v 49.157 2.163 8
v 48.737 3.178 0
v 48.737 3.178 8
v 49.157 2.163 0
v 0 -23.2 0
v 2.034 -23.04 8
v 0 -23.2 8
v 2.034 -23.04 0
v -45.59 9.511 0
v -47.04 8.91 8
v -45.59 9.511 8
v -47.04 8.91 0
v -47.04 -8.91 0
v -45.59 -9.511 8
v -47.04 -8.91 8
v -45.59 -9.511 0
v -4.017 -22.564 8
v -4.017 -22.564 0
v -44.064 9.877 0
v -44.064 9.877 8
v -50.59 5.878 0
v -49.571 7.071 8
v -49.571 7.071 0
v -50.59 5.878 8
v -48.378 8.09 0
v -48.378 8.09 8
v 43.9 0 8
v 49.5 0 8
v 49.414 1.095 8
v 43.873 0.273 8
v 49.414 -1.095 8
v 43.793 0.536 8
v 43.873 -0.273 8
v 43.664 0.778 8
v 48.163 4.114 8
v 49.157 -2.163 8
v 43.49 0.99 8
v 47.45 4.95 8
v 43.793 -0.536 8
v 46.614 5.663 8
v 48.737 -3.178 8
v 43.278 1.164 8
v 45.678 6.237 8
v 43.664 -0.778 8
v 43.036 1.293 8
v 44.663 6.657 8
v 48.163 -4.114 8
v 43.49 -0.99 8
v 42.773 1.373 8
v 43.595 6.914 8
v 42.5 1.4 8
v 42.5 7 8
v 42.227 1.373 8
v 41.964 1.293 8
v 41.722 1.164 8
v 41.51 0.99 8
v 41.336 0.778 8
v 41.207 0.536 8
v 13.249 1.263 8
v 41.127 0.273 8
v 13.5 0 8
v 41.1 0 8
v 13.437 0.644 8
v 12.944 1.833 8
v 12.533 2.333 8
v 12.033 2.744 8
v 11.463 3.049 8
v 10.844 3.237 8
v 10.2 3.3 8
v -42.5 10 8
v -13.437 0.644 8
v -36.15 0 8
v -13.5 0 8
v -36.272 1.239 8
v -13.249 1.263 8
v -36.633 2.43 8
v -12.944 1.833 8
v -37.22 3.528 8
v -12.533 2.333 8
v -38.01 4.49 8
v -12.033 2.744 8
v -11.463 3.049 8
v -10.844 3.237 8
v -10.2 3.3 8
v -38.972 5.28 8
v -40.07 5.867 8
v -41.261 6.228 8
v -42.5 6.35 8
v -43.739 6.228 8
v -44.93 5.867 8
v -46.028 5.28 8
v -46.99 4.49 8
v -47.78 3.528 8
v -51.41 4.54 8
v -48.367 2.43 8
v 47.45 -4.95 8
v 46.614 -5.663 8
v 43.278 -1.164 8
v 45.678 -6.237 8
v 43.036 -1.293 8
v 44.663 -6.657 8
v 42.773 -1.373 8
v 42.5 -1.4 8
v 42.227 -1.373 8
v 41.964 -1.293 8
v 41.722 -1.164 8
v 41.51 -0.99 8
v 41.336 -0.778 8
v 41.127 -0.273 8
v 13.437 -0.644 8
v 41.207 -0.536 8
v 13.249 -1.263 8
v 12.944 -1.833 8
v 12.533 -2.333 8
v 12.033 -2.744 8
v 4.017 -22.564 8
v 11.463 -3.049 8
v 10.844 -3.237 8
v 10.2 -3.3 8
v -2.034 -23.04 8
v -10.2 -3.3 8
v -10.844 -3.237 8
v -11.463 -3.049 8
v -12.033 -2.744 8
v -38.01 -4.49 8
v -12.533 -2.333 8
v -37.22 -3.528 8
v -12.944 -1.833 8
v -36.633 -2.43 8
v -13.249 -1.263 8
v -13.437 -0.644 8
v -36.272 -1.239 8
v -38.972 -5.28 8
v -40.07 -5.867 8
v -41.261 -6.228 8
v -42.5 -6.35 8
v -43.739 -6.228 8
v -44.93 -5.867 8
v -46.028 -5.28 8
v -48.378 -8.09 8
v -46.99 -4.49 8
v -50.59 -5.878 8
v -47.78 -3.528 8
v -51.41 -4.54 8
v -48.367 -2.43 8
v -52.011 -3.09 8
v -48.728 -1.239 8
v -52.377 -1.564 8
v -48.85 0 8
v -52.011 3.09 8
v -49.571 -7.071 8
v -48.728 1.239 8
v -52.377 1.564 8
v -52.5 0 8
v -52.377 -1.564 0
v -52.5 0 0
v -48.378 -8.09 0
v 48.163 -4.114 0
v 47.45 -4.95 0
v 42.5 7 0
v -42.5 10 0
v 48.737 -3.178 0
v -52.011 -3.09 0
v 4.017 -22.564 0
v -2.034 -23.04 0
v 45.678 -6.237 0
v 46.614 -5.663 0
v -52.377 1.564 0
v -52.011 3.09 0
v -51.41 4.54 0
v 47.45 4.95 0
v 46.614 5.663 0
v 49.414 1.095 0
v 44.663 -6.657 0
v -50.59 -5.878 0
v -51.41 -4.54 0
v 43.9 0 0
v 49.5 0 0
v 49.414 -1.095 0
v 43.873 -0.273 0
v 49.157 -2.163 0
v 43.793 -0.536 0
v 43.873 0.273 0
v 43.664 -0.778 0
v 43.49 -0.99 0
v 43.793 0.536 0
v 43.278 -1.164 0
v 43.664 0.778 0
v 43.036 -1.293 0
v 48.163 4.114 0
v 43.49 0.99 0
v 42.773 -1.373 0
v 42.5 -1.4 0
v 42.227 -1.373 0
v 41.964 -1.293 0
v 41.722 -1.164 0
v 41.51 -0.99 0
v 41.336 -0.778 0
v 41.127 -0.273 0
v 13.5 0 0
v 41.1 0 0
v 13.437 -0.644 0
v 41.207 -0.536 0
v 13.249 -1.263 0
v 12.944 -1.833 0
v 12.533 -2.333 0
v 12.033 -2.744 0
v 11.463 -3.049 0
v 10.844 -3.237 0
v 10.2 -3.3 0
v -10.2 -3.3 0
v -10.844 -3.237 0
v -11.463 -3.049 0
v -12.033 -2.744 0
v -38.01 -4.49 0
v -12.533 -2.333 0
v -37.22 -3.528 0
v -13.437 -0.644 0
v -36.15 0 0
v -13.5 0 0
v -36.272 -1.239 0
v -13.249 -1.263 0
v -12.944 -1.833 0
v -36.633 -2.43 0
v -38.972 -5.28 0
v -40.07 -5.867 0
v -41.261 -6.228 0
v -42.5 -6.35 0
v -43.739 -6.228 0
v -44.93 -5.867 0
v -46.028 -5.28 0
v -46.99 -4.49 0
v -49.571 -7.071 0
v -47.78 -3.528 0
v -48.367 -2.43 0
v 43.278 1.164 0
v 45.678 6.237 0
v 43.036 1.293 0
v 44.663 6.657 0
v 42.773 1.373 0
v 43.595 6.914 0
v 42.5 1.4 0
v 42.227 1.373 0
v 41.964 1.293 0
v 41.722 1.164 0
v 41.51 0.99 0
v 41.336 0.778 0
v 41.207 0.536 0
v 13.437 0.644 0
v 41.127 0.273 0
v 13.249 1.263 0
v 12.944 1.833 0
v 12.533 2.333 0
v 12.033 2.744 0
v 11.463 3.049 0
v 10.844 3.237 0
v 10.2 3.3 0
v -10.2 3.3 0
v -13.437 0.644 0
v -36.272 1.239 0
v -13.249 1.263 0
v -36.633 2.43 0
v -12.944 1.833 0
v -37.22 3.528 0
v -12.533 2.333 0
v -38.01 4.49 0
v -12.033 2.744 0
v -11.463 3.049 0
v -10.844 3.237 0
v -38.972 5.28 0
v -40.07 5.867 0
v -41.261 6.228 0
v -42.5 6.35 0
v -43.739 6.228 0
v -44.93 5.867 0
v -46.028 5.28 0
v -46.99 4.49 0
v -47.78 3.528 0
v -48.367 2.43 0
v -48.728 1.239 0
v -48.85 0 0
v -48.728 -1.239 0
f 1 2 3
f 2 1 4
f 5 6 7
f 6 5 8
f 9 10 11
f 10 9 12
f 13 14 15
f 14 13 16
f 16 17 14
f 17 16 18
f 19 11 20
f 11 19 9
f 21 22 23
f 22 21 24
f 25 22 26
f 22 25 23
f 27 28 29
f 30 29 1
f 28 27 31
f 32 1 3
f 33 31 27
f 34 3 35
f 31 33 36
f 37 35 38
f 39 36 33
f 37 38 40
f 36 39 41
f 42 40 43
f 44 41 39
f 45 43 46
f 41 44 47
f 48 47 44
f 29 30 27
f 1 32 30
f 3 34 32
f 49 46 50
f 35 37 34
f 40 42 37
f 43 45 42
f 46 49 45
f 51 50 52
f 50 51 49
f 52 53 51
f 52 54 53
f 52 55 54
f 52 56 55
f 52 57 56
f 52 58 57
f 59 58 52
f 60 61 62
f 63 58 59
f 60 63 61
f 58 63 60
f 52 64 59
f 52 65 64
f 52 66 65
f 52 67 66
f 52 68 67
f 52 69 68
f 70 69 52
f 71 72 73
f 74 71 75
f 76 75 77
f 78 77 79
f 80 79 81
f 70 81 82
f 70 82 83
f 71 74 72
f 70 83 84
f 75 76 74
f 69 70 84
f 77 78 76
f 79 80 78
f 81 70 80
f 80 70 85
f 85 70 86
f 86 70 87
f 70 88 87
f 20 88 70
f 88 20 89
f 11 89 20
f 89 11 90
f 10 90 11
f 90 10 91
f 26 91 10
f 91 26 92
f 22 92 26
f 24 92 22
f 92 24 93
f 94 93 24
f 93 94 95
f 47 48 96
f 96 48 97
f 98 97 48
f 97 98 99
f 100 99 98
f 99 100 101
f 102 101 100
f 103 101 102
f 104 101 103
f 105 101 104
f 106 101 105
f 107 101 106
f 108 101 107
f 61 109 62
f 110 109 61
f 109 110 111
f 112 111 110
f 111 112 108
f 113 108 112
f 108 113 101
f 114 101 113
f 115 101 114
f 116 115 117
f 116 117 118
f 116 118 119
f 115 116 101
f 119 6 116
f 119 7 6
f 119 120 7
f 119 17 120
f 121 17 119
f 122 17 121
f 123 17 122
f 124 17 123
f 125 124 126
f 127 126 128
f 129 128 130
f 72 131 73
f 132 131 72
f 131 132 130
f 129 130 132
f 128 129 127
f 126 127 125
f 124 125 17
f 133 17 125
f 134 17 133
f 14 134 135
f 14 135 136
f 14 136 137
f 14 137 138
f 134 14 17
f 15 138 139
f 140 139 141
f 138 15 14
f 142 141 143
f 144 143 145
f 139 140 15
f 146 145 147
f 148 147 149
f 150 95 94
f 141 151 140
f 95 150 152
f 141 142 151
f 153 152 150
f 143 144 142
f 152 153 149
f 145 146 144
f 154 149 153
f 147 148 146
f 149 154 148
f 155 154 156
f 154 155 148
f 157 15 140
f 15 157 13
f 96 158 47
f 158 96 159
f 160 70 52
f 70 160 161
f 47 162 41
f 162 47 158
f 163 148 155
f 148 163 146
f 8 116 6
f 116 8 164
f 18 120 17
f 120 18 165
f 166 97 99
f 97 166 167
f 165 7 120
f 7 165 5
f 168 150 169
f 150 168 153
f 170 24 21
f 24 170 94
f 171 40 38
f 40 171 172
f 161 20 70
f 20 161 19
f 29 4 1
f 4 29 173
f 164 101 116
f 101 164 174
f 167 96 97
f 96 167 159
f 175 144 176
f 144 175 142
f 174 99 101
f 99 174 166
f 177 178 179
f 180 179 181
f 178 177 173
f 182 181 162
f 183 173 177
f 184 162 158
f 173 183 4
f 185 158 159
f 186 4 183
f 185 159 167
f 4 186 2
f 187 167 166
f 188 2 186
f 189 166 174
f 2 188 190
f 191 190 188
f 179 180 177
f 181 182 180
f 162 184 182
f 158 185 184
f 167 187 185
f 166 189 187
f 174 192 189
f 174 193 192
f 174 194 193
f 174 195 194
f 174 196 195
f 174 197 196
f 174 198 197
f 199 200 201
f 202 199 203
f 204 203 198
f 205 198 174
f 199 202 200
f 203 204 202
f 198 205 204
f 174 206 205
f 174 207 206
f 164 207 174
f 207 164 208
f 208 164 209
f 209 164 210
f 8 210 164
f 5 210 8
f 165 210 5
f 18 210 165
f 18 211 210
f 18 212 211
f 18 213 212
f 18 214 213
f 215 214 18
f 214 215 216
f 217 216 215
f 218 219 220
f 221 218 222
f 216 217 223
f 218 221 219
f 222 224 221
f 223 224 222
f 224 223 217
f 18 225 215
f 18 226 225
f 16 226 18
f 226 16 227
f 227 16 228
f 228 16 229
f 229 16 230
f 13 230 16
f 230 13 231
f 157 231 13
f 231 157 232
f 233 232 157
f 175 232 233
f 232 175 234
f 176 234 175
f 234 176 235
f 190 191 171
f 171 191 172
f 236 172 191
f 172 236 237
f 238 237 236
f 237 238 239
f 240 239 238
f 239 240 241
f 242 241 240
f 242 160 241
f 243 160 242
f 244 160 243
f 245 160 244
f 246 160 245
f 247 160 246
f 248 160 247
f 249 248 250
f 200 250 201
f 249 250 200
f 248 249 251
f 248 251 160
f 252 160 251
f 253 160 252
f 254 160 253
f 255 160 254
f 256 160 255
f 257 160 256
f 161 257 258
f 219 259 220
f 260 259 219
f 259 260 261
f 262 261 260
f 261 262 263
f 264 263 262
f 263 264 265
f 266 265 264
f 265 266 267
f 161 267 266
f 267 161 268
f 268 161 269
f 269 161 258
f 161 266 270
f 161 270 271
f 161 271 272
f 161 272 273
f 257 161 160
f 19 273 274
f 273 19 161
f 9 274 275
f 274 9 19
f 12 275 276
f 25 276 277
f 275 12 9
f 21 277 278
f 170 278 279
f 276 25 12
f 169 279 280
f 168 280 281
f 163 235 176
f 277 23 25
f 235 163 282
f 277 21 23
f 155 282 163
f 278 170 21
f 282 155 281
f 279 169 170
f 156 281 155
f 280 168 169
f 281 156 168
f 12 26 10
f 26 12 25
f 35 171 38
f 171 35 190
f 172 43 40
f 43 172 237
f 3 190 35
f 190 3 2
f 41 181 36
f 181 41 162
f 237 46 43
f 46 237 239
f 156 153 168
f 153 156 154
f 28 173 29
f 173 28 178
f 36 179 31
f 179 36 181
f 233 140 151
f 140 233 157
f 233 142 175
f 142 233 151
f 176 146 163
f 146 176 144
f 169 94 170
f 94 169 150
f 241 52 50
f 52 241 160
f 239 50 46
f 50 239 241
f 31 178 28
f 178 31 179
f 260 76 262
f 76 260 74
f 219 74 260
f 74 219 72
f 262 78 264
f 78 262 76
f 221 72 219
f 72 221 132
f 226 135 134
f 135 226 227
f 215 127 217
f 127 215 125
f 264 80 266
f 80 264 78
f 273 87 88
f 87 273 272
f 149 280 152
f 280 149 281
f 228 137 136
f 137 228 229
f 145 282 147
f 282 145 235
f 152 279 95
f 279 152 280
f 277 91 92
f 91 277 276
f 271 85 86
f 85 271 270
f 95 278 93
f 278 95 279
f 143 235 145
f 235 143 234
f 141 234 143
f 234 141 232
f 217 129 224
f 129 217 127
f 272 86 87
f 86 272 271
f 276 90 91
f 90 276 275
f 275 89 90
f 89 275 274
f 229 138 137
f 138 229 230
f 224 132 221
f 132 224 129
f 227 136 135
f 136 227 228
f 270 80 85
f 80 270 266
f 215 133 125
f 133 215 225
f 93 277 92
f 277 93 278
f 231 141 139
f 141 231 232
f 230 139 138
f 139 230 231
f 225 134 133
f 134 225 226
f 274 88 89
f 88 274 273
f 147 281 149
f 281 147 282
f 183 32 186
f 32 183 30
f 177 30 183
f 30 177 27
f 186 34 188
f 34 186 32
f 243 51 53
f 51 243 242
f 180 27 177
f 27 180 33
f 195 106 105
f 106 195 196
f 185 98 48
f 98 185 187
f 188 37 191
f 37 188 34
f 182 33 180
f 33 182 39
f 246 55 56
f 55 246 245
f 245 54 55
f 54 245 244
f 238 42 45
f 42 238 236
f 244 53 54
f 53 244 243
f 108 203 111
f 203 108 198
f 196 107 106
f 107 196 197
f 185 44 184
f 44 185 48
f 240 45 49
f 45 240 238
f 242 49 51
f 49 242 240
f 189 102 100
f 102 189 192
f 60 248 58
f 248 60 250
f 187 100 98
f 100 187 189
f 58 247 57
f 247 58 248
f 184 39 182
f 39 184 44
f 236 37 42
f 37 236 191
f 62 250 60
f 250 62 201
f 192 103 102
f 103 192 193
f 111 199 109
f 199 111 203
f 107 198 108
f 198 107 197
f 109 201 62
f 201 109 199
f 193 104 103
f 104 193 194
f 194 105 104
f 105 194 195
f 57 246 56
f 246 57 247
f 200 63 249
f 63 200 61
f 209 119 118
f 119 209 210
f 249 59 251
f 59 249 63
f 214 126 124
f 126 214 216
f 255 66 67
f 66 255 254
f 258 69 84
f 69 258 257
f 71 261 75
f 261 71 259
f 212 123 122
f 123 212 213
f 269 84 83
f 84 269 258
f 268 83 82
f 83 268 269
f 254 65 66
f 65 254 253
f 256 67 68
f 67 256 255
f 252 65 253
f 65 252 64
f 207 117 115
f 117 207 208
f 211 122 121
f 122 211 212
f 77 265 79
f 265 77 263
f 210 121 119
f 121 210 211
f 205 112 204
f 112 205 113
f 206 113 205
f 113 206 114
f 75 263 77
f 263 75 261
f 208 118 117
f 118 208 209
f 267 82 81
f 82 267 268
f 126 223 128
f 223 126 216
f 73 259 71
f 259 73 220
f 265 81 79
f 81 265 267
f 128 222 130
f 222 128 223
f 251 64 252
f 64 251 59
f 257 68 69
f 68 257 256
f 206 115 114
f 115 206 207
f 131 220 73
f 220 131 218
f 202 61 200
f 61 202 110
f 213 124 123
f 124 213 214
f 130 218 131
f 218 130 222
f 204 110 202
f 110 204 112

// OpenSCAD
$fn = 32;

// ----------------------------------------------------------------------
// Lever: 85 mm between the bosses, 8 mm thick, smooth outline
// ----------------------------------------------------------------------

// --- parameters (mm) ---
lever_l = 85;             // distance between the boss centres
boss_a = 20;              // first boss diameter
boss_b = 14;              // second boss diameter
bore_a = 12.7;            // first bore
bore_b = 2.8;             // second bore
lever_t = 8;              // lever thickness
boss_c = 26;              // middle boss diameter
bend = 10.2;              // how far the middle boss drops
slot_w = 6.6;             // adjustment slot width

lever_profile = [[-52.5, 0], [-52.377, -1.564], [-52.011, -3.09], [-51.41, -4.54], [-50.59, -5.878], [-49.571, -7.071], [-48.378, -8.09], [-47.04, -8.91], [-45.59, -9.511], [-4.017, -22.564], [-2.034, -23.04], [0, -23.2], [2.034, -23.04], [4.017, -22.564], [44.663, -6.657], [45.678, -6.237], [46.614, -5.663], [47.45, -4.95], [48.163, -4.114], [48.737, -3.178], [49.157, -2.163], [49.414, -1.095], [49.5, 0], [49.414, 1.095], [49.157, 2.163], [48.737, 3.178], [48.163, 4.114], [47.45, 4.95], [46.614, 5.663], [45.678, 6.237], [44.663, 6.657], [43.595, 6.914], [42.5, 7], [-42.5, 10], [-44.064, 9.877], [-45.59, 9.511], [-47.04, 8.91], [-48.378, 8.09], [-49.571, 7.071], [-50.59, 5.878], [-51.41, 4.54], [-52.011, 3.09], [-52.377, 1.564]];

difference() {
  linear_extrude(height = lever_t) polygon(lever_profile);
  translate([-42.5, 0, -2.5]) cylinder(h = lever_t + 5, d = bore_a);
  translate([42.5, 0, -2.5]) cylinder(h = lever_t + 5, d = bore_b);
  /* slotted adjustment, stadium shaped */
  hull() {
    translate([-10.2, 0, -2.5]) cylinder(h = lever_t + 5, d = slot_w);
    translate([10.2, 0, -2.5]) cylinder(h = lever_t + 5, d = slot_w);
  }
}
